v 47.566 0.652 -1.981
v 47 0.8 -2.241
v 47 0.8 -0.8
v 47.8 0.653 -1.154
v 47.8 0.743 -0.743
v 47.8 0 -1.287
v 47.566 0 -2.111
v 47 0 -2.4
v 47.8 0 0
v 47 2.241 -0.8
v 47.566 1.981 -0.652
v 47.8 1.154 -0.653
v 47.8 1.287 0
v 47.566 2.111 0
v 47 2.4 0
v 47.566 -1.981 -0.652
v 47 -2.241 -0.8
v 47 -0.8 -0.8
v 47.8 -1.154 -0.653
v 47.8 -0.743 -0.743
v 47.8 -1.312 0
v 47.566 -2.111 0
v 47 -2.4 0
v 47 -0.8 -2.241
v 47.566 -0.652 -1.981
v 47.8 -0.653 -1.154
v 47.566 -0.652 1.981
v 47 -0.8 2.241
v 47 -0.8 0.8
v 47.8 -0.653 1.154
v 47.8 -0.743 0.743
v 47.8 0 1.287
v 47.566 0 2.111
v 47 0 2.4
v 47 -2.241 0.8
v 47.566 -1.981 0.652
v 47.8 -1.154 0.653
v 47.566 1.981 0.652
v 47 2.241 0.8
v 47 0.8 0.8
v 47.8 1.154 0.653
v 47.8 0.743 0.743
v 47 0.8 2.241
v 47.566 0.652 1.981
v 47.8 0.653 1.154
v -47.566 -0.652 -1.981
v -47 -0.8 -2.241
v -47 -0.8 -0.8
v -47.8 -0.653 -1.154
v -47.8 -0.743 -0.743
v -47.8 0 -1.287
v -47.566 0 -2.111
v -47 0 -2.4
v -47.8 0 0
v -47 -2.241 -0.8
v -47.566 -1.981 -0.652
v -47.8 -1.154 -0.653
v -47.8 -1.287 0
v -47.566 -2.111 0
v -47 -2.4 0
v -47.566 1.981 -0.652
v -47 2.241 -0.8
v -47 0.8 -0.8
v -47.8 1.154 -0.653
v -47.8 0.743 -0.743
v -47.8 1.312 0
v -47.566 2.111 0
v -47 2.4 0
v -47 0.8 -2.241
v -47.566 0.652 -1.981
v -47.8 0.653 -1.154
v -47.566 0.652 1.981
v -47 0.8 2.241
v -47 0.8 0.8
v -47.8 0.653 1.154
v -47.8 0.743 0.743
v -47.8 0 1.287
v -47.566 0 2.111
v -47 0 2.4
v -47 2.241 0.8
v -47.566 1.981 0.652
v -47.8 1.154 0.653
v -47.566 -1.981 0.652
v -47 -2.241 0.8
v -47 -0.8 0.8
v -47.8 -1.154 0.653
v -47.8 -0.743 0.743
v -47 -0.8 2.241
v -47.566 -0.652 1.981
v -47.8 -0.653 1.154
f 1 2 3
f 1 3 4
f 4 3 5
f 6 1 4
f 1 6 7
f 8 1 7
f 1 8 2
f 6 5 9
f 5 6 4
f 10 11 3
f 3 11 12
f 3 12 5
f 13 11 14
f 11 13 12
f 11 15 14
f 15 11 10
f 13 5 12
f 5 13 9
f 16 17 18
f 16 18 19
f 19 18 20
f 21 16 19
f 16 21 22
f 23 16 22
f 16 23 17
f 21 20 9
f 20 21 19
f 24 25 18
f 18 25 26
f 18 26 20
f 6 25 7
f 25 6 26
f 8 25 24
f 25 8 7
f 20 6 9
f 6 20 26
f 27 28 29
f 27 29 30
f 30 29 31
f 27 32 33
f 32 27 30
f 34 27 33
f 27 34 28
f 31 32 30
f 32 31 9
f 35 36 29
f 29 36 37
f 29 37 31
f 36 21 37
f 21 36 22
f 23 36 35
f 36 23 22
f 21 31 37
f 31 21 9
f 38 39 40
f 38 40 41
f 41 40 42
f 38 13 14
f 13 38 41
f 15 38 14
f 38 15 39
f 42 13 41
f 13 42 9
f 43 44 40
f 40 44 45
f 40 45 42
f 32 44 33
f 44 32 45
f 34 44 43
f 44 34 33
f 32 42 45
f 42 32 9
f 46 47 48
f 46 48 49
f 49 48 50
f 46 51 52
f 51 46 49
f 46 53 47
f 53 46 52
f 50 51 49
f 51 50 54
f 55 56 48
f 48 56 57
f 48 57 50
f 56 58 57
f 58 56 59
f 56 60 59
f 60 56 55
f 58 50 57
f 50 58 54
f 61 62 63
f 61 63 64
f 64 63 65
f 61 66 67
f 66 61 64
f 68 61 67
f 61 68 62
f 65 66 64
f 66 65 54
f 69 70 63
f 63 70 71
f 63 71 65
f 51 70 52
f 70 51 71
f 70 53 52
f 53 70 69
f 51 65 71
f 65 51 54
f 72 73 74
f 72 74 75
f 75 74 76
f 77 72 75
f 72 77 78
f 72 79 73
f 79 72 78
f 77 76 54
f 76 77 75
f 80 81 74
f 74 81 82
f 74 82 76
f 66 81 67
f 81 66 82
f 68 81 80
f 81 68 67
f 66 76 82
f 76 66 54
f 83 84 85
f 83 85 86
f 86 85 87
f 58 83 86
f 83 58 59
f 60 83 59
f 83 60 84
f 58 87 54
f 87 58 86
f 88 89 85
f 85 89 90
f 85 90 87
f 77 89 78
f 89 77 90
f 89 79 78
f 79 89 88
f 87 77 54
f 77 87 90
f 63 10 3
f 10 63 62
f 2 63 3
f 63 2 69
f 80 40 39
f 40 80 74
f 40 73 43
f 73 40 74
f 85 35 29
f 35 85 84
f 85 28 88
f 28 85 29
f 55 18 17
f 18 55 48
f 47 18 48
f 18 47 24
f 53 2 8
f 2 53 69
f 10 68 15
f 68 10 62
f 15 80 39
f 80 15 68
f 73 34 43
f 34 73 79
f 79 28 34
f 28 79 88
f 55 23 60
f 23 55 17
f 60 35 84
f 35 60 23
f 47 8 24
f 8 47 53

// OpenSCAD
// file: ../p/box2-9p.scad
use <../lib.scad>
function ldraw_lib__box2_9p() = [
// 0 Box with  2 Faces with  3 Parallel Edges
// 0 Name: box2-9p.dat
// 0 Author: Willy Tschager [Holly-Wood]
// 0 !LDRAW_ORG Primitive UPDATE 2024-01
// 0 !LICENSE Licensed under CC BY 4.0 : see CAreadme.txt
// 
// 0 BFC CERTIFY CCW
  [0,"BFC","CERTIFY"],
  [0,"BFC","CCW"],
// 
// 0 !HISTORY 2013-12-23 [PTadmin] Official Update 2013-02
// 0 !HISTORY 2024-01-04 [Holly-Wood] Complete re-write, original by Duq
// 0 !HISTORY 2024-01-29 [OrionP] Official Update 2024-01
// 
// 2 24 -1 1 1 1 1 1
  [2,24,-1,1,1,1,1,1],
// 2 24 -1 1 -1 1 1 -1
  [2,24,-1,1,-1,1,1,-1],
// 4 16 -1 1 1 1 1 1 1 1 -1 -1 1 -1
  [4,16,-1,1,1,1,1,1,1,1,-1,-1,1,-1],
// 
// 2 24 -1 -1 1 1 -1 1
  [2,24,-1,-1,1,1,-1,1],
// 4 16 1 -1 1 1 1 1 -1 1 1 -1 -1 1
  [4,16,1,-1,1,1,1,1,-1,1,1,-1,-1,1],
];
module ldraw_lib__box2_9p(step=0, col=false, unit=2/5, alt=false, line=0.2, solid=!$preview)
    makepoly(ldraw_lib__box2_9p(), step=step, col=col, unit=unit, alt=alt, line=line, solid=solid);
ldraw_lib__box2_9p(line=0.2);
// file: ../p/axlehol8.scad
use <../lib.scad>
use <box2-9p.scad>
function ldraw_lib__axlehol8() = [
// 0 Technic Axle Perimeter
// 0 Name: axlehol8.dat
// 0 Author: Steve Bliss [sbliss]
// 0 !LDRAW_ORG Primitive UPDATE 2024-01
// 0 !LICENSE Licensed under CC BY 4.0 : see CAreadme.txt
// 
// 0 BFC CERTIFY CCW
  [0,"BFC","CERTIFY"],
  [0,"BFC","CCW"],
// 
// 0 !HISTORY 2000-05-07 [PTadmin] Official Update 2000-01
// 0 !HISTORY 2002-11-08 [OrionP] Adjusted fit and precision
// 0 !HISTORY 2003-03-12 [PTadmin] Official Update 2003-01
// 0 !HISTORY 2007-06-24 [PTadmin] Header formatted for Contributor Agreement
// 0 !HISTORY 2008-07-01 [PTadmin] Official Update 2008-01
// 0 !HISTORY 2021-03-25 [Sirio] Rounded to four decimals and added primitives
// 0 !HISTORY 2022-03-06 [PTadmin] Official Update 2022-02
// 0 !HISTORY 2024-01-24 [MagFors] Update description, to be only used on axles, not holes
// 0 !HISTORY 2024-01-29 [OrionP] Official Update 2024-01
// 
// 0 // Primitives
// 0 BFC INVERTNEXT
  [0,"BFC","INVERTNEXT"],
// 1 16 3.80115 .5 3.80115 0 -1.80115 0 .5 0 0 0 0 -1.80115 box2-9p.dat
  [1,16,3.80115,.5,3.80115,0,-1.80115,0,.5,0,0,0,0,-1.80115, ldraw_lib__box2_9p()],
// 0 BFC INVERTNEXT
  [0,"BFC","INVERTNEXT"],
// 1 16 -3.80115 .5 3.80115 0 1.80115 0 .5 0 0 0 0 -1.80115 box2-9p.dat
  [1,16,-3.80115,.5,3.80115,0,1.80115,0,.5,0,0,0,0,-1.80115, ldraw_lib__box2_9p()],
// 0 BFC INVERTNEXT
  [0,"BFC","INVERTNEXT"],
// 1 16 -3.80115 .5 -3.80115 0 1.80115 0 .5 0 0 0 0 1.80115 box2-9p.dat
  [1,16,-3.80115,.5,-3.80115,0,1.80115,0,.5,0,0,0,0,1.80115, ldraw_lib__box2_9p()],
// 0 BFC INVERTNEXT
  [0,"BFC","INVERTNEXT"],
// 1 16 3.80115 .5 -3.80115 0 -1.80115 0 .5 0 0 0 0 1.80115 box2-9p.dat
  [1,16,3.80115,.5,-3.80115,0,-1.80115,0,.5,0,0,0,0,1.80115, ldraw_lib__box2_9p()],
// 0 // Faces
// 4 16 5.6023 1 2 5.6023 0 2 6 0 0 6 1 0
  [4,16,5.6023,1,2,5.6023,0,2,6,0,0,6,1,0],
// 4 16 2 1 5.6023 0 1 6 0 0 6 2 0 5.6023
  [4,16,2,1,5.6023,0,1,6,0,0,6,2,0,5.6023],
// 4 16 -2 1 5.6023 -2 0 5.6023 0 0 6 0 1 6
  [4,16,-2,1,5.6023,-2,0,5.6023,0,0,6,0,1,6],
// 4 16 -5.6023 1 2 -6 1 0 -6 0 0 -5.6023 0 2
  [4,16,-5.6023,1,2,-6,1,0,-6,0,0,-5.6023,0,2],
// 4 16 -5.6023 1 -2 -5.6023 0 -2 -6 0 0 -6 1 0
  [4,16,-5.6023,1,-2,-5.6023,0,-2,-6,0,0,-6,1,0],
// 4 16 2 1 -5.6023 2 0 -5.6023 0 0 -6 0 1 -6
  [4,16,2,1,-5.6023,2,0,-5.6023,0,0,-6,0,1,-6],
// 4 16 -2 1 -5.6023 0 1 -6 0 0 -6 -2 0 -5.6023
  [4,16,-2,1,-5.6023,0,1,-6,0,0,-6,-2,0,-5.6023],
// 4 16 5.6023 1 -2 6 1 0 6 0 0 5.6023 0 -2
  [4,16,5.6023,1,-2,6,1,0,6,0,0,5.6023,0,-2],
// 0 // Conditional lines
// 5 24 0 0 6 0 1 6 -2 0 5.6023 2 0 5.6023
  [5,24,0,0,6,0,1,6,-2,0,5.6023,2,0,5.6023],
// 5 24 -6 0 0 -6 1 0 -5.6023 0 -2 -5.6023 0 2
  [5,24,-6,0,0,-6,1,0,-5.6023,0,-2,-5.6023,0,2],
// 5 24 0 0 -6 0 1 -6 -2 0 -5.6023 2 0 -5.6023
  [5,24,0,0,-6,0,1,-6,-2,0,-5.6023,2,0,-5.6023],
// 5 24 6 0 0 6 1 0 5.6023 0 2 5.6023 0 -2
  [5,24,6,0,0,6,1,0,5.6023,0,2,5.6023,0,-2],
];
module ldraw_lib__axlehol8(step=0, col=false, unit=2/5, alt=false, line=0.2, solid=!$preview)
    makepoly(ldraw_lib__axlehol8(), step=step, col=col, unit=unit, alt=alt, line=line, solid=solid);
ldraw_lib__axlehol8(line=0.2);
// main file
use <../lib.scad>
use <../p/axleend2.scad>
use <../p/axlehol8.scad>
function ldraw_lib__3708() = [
// 0 Technic Axle 12
// 0 Name: 3708.dat
// 0 Author: James Jessiman
// 0 !LDRAW_ORG Part UPDATE 2025-09
// 0 !LICENSE Licensed under CC BY 4.0 : see CAreadme.txt
// 
// 0 BFC CERTIFY CCW
  [0,"BFC","CERTIFY"],
  [0,"BFC","CCW"],
// 
// 0 !HISTORY 2004-07-11 [guyvivan] BFC'ed
// 0 !HISTORY 2005-12-28 [PTadmin] Official Update 2005-01
// 0 !HISTORY 2007-06-29 [PTadmin] Header formatted for Contributor Agreement
// 0 !HISTORY 2008-07-01 [PTadmin] Official Update 2008-01
// 0 !HISTORY 2025-09-01 [MagFors] Beveled axle ends
// 0 !HISTORY 2025-09-29 [OrionP] Official Update 2025-09
// 
// 1 16 120 0 0 0 -1 0 1 0 0 0 0 1 axleend2.dat
  [1,16,120,0,0,0,-1,0,1,0,0,0,0,1, ldraw_lib__axleend2()],
// 1 16 -120 0 0 0 1 0 1 0 0 0 0 -1 axleend2.dat
  [1,16,-120,0,0,0,1,0,1,0,0,0,0,-1, ldraw_lib__axleend2()],
// 1 16 117.5 0 0 0 -235 0 1 0 0 0 0 1 axlehol8.dat
  [1,16,117.5,0,0,0,-235,0,1,0,0,0,0,1, ldraw_lib__axlehol8()],
];
module ldraw_lib__3708(step=0, col=false, unit=2/5, alt=false, line=0.2, solid=!$preview)
    makepoly(ldraw_lib__3708(), step=step, col=col, unit=unit, alt=alt, line=line, solid=solid);
ldraw_lib__3708(line=0.2);
